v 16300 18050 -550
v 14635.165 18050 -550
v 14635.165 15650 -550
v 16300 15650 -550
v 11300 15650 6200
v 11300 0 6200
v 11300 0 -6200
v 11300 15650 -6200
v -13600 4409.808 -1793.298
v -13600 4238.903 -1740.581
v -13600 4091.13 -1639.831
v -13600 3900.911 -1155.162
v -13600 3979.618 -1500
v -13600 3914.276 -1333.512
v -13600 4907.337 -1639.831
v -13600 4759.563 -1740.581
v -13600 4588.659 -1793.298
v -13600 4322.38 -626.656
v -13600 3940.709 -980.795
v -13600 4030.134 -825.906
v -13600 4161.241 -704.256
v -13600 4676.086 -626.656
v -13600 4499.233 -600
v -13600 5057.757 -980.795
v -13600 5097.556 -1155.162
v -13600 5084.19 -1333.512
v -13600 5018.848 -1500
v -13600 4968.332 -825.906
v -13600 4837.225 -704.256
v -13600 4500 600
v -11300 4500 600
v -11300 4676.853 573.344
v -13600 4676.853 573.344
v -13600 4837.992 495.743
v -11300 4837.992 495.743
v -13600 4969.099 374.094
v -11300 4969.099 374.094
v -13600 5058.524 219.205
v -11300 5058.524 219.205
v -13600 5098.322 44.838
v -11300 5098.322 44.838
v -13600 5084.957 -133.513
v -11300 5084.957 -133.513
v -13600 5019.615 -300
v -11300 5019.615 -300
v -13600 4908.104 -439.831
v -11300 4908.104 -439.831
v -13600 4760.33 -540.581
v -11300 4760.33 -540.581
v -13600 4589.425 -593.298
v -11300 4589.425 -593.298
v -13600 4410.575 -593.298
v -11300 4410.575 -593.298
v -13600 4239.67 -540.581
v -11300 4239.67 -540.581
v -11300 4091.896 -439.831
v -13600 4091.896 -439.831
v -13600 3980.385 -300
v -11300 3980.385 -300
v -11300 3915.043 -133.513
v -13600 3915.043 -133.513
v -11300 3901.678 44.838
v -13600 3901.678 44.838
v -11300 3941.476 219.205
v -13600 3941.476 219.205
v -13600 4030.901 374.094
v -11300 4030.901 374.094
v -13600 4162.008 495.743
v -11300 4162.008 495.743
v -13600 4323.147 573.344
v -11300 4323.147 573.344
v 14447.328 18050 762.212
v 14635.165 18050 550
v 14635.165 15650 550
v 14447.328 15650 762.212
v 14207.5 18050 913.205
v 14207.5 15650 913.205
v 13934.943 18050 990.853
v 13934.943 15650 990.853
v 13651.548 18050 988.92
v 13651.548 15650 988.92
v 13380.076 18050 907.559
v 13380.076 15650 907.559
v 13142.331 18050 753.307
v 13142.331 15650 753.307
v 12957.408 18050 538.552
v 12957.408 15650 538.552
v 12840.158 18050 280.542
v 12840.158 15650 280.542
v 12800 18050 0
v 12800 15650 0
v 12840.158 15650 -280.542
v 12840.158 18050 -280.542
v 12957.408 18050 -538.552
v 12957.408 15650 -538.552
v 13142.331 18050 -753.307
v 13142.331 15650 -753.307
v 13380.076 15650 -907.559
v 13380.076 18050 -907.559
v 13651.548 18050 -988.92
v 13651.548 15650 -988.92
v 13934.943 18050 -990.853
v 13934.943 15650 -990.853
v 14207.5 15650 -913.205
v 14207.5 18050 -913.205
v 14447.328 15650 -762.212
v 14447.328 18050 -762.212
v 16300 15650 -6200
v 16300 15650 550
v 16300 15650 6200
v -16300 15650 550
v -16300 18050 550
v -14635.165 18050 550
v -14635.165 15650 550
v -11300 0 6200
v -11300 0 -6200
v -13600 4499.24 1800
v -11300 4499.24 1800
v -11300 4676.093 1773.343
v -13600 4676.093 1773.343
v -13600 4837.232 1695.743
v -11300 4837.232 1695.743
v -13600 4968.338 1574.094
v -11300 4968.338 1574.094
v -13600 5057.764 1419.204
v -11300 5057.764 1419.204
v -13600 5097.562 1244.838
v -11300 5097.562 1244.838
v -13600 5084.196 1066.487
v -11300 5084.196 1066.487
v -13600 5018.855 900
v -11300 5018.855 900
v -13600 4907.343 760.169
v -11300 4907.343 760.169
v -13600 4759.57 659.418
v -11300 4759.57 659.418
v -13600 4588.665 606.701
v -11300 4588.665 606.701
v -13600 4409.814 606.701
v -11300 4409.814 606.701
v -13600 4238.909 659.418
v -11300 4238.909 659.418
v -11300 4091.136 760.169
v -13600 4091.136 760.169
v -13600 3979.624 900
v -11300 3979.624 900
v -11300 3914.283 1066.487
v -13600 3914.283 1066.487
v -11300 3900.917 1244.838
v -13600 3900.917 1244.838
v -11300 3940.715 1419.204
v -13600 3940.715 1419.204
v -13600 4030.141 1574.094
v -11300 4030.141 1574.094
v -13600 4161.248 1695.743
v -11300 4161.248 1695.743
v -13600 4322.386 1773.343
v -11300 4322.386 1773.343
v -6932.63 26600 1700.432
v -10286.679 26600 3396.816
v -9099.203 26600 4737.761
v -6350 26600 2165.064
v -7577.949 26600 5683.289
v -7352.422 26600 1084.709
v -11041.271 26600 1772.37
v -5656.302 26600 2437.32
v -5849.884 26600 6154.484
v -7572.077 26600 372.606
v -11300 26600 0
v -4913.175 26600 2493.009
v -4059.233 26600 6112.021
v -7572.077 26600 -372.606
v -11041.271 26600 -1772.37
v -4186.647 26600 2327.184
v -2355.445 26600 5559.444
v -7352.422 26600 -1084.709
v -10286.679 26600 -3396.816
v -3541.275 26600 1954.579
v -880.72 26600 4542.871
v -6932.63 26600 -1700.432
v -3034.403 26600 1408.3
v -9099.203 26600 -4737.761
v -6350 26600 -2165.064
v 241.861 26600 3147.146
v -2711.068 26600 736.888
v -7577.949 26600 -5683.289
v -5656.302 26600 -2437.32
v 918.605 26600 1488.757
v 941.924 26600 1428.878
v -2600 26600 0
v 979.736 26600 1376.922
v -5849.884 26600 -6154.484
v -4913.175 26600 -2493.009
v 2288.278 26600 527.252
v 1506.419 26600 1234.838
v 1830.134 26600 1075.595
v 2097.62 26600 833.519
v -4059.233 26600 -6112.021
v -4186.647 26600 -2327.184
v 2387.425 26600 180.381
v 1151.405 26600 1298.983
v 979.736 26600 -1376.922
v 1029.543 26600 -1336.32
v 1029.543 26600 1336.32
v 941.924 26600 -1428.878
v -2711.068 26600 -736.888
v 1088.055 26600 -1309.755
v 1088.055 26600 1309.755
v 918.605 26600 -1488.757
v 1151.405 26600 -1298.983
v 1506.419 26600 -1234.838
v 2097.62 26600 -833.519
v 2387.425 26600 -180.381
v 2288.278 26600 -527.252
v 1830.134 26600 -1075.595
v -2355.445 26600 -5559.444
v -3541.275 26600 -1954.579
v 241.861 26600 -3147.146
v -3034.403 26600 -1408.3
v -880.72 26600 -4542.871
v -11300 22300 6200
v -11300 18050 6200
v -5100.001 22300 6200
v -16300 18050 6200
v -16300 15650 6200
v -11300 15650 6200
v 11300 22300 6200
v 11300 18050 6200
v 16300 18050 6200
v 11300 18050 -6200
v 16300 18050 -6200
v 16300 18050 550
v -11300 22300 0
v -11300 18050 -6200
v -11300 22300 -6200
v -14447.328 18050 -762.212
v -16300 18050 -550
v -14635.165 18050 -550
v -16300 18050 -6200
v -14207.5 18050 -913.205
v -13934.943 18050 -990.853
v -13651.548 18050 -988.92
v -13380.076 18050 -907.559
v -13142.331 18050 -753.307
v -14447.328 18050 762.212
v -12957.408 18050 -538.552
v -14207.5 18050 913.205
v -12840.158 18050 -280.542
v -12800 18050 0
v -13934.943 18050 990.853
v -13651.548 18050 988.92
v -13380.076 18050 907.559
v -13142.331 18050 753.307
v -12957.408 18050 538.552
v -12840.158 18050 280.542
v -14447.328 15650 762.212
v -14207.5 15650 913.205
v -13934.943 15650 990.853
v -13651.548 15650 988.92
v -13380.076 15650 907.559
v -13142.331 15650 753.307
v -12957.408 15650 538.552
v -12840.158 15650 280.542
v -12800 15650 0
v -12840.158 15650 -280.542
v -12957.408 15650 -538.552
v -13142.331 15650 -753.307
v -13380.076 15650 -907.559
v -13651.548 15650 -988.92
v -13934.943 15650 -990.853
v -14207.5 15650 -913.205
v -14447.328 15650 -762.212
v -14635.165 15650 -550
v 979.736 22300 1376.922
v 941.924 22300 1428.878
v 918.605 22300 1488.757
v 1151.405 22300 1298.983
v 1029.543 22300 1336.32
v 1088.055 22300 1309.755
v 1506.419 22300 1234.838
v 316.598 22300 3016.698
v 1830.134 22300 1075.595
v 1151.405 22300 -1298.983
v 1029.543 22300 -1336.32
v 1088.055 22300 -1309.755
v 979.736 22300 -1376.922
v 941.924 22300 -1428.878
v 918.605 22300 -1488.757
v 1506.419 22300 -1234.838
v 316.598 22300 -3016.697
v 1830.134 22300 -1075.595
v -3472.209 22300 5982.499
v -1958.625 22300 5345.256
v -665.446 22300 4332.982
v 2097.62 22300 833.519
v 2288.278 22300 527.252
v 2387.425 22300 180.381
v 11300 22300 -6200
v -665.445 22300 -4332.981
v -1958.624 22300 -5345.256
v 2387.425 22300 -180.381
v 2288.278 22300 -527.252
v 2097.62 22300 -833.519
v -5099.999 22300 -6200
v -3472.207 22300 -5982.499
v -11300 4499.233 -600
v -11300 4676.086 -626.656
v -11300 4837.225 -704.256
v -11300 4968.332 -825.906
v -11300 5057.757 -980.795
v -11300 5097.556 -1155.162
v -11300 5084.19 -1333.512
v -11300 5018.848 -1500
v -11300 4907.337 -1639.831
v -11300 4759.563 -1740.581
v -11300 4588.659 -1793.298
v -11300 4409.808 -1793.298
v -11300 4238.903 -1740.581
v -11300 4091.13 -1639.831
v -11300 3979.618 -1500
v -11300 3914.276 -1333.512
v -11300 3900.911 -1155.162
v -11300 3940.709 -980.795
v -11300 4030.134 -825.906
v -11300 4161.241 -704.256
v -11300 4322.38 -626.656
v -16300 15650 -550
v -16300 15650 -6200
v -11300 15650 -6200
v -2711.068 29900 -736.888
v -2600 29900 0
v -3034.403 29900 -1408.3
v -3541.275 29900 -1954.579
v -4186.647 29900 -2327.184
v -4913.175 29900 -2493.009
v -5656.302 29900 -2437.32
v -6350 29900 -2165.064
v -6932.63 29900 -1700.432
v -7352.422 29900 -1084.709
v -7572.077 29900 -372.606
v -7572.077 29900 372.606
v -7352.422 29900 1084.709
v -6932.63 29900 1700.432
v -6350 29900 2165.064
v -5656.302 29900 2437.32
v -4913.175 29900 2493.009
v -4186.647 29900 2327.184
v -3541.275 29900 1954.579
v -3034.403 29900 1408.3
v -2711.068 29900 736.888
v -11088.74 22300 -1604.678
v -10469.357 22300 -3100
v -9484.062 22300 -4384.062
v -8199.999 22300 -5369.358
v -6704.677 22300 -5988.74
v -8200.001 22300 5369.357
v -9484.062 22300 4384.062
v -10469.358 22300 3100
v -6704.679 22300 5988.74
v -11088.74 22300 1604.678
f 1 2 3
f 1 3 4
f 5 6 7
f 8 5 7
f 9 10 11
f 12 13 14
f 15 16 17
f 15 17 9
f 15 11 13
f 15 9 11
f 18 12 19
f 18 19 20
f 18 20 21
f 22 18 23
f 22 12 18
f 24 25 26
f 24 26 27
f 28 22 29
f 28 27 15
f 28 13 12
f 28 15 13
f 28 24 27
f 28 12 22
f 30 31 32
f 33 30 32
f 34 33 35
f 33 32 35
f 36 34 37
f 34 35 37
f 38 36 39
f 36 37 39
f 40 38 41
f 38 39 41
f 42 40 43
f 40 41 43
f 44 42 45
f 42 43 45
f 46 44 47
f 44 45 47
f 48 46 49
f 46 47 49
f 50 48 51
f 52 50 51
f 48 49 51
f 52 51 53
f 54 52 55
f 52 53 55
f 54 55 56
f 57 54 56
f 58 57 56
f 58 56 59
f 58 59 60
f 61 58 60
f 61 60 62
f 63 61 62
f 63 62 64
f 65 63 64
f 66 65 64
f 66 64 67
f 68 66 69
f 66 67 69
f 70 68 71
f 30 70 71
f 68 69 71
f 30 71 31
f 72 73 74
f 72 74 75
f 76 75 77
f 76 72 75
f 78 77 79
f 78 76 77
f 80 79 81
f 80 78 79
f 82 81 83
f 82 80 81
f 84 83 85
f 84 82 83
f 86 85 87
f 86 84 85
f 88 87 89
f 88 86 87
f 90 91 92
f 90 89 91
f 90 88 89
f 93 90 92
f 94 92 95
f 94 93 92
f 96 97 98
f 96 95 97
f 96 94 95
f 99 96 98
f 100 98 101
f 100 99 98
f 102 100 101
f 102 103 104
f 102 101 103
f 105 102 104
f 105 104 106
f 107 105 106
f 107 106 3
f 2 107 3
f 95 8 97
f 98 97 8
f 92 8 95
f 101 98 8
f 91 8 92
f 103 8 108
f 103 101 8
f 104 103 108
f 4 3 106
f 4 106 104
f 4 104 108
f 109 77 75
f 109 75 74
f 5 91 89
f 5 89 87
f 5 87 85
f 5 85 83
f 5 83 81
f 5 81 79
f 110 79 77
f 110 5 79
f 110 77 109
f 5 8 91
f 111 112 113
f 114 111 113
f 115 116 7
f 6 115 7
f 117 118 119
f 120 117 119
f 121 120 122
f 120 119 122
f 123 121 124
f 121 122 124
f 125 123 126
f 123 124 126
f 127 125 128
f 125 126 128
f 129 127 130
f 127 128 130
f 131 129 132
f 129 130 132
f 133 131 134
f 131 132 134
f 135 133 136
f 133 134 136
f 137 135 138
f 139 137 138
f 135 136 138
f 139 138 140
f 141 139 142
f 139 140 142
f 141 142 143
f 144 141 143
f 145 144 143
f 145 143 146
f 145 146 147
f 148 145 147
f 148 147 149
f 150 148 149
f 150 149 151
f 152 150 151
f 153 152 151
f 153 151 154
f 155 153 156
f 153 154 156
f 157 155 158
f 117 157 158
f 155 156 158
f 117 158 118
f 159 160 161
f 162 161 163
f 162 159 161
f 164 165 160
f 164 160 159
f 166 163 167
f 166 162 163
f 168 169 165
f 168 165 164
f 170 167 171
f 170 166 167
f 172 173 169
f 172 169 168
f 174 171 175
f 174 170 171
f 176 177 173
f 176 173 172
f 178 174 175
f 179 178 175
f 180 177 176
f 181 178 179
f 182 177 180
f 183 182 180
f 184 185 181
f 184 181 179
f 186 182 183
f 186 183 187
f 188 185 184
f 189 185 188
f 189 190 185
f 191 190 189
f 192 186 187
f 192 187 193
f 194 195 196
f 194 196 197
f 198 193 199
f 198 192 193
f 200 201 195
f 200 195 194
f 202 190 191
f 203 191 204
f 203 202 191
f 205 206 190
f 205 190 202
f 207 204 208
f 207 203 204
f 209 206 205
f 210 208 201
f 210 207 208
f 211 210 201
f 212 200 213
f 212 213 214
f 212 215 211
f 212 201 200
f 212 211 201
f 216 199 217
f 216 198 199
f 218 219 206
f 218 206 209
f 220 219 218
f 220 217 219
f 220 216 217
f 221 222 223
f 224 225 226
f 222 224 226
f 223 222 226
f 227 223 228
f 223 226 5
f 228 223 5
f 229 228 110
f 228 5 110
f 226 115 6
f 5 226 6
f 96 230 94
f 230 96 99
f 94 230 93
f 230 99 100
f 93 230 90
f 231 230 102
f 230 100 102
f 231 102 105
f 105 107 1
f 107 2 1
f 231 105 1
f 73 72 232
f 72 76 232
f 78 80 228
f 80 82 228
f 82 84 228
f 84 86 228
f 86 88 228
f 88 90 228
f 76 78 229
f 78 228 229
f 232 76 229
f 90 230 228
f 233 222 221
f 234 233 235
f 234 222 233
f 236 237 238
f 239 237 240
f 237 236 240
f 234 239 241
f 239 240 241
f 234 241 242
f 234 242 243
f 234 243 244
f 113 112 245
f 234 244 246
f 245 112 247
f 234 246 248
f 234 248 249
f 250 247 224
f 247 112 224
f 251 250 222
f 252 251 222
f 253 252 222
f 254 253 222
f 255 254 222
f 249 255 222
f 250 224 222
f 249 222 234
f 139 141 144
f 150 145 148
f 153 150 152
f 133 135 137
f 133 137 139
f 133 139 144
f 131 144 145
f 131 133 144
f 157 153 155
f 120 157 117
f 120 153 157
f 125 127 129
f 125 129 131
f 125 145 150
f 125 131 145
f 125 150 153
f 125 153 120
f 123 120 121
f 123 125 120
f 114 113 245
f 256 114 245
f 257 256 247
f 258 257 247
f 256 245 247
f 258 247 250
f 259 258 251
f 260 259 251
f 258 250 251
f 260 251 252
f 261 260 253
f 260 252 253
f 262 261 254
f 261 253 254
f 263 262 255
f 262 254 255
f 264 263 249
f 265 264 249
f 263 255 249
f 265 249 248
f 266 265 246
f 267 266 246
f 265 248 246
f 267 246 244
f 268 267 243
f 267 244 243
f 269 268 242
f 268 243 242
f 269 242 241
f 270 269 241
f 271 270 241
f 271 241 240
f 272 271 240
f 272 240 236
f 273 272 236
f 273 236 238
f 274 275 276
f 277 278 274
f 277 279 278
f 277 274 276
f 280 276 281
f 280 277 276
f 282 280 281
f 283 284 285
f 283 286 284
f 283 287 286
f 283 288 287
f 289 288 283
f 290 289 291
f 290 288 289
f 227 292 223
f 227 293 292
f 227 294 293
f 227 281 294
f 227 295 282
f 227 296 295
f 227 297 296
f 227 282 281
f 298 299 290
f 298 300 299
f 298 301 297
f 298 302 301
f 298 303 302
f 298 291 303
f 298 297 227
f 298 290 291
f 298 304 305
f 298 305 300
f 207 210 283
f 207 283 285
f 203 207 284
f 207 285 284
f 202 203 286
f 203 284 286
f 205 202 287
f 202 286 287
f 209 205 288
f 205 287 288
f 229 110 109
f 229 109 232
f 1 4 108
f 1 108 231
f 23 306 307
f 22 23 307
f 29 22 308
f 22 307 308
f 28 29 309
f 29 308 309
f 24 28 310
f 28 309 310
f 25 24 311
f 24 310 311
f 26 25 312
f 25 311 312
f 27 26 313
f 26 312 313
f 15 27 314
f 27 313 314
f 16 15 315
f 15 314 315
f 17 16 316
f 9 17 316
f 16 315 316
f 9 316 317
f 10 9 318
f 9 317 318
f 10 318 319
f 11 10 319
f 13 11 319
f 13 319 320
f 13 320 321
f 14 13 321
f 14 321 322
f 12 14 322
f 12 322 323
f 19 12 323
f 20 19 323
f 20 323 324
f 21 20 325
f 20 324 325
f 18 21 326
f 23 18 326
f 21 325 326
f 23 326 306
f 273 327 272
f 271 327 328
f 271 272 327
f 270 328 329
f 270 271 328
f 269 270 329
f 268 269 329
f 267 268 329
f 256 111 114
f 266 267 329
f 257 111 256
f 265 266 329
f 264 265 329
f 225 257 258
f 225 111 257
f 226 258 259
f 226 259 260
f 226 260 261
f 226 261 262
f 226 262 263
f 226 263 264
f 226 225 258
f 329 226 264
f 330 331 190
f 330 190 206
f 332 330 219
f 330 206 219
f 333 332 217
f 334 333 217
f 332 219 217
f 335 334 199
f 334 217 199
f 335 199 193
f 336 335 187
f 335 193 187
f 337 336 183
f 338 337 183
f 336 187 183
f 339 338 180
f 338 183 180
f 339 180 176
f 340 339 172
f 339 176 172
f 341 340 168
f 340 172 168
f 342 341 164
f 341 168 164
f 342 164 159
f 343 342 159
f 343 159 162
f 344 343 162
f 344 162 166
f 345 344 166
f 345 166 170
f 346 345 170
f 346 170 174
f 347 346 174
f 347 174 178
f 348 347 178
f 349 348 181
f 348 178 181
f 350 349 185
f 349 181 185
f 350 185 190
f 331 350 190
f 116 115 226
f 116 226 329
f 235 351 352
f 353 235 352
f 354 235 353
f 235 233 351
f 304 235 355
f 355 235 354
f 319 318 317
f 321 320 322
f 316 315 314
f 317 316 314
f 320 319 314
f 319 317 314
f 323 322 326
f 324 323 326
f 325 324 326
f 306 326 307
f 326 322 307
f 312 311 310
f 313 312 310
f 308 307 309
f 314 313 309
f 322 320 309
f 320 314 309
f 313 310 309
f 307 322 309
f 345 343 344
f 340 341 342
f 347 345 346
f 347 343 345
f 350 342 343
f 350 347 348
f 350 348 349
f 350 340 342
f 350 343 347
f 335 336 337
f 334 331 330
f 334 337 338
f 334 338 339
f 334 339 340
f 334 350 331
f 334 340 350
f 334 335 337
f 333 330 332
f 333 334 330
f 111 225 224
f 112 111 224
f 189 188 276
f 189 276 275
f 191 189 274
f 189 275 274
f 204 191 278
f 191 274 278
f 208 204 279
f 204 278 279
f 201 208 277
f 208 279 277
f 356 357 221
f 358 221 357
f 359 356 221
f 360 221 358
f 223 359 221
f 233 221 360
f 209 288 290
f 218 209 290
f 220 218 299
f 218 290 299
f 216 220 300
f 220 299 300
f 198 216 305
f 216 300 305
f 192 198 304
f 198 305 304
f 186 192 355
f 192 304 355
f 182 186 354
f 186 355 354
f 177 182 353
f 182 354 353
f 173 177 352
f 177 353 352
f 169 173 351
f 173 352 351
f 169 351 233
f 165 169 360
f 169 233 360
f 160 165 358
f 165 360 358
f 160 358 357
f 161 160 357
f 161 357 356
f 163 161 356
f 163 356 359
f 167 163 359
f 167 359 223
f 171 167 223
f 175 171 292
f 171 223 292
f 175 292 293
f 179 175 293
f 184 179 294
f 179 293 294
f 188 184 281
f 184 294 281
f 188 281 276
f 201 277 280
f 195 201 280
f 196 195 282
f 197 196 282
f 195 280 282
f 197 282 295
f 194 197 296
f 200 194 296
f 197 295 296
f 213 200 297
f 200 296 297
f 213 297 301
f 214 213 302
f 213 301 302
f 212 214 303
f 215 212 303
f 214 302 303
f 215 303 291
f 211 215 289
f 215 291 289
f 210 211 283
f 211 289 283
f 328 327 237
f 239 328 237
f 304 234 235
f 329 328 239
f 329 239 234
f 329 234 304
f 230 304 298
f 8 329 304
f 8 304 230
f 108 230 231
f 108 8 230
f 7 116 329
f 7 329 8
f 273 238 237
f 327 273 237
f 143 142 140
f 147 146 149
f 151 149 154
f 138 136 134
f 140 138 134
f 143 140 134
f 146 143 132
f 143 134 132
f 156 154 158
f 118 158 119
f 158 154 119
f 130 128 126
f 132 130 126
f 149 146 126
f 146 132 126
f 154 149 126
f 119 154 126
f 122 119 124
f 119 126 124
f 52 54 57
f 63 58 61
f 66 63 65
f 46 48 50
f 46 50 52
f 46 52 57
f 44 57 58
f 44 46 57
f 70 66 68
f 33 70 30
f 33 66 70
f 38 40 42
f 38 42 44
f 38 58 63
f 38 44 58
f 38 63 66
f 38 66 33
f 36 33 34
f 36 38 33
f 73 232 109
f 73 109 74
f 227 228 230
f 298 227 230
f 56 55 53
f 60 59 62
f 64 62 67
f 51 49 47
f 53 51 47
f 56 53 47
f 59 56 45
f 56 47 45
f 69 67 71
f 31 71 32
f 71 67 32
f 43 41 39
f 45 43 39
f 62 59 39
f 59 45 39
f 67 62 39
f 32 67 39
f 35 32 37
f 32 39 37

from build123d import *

# Parameters (mm, degrees)
SKETCH1_W             = 22600
SKETCH1_H             = 12400
BOSS_EXTRUDE1_DEPTH   = 22300
SKETCH2_W             = 5000
SKETCH2_H             = 2400
BOSS_EXTRUDE2_DEPTH   = 12400
CUT_EXTRUDE1_DEPTH    = 22300
BOSS_EXTRUDE3_DEPTH   = 4300
SKETCH5_R             = 2500
BOSS_EXTRUDE4_DEPTH   = 3300
SKETCH6_R             = 600
BOSS_EXTRUDE5_DEPTH   = 2300
BOSS_EXTRUDE5_2_DEPTH = 2300
BOSS_EXTRUDE5_3_DEPTH = 2300


with BuildPart() as part:
    # Sketch1 → Boss-Extrude1 (new body)
    with BuildSketch(Plane(origin=(0, 0, 0), x_dir=(1, 0, 0), z_dir=(0, 1, 0))):
        Rectangle(SKETCH1_W, SKETCH1_H)
    extrude(amount=BOSS_EXTRUDE1_DEPTH)

    # Sketch2 → Boss-Extrude2 (add)
    with BuildSketch(Plane.XY.offset(6200)):
        with Locations((13800, 16850)):
            Rectangle(SKETCH2_W, SKETCH2_H)
        with Locations((-13800, 16850)):
            Rectangle(SKETCH2_W, SKETCH2_H)
    extrude(amount=-BOSS_EXTRUDE2_DEPTH)

    # Sketch3 → Cut-Extrude1 (cut)
    with BuildSketch(Plane(origin=(0, 18050, 0), x_dir=(1, 0, 0), z_dir=(0, 1, 0))):
        with BuildLine():
            Line((14635.164654425, 550), (16300, 550))
            Line((16300, 550), (16300, -550))
            Line((16300, -550), (14635.164654425, -550))
            ThreePointArc((14635.164654425, -550), (12800, 0), (14635.164654425, 550))
        make_face()
        with BuildLine():
            Line((-16300, 550), (-16300, -550))
            Line((-16300, -550), (-14635.164654425, -550))
            ThreePointArc((-14635.164654425, -550), (-12800, 0), (-14635.164654425, 550))
            Line((-14635.164654425, 550), (-16300, 550))
        make_face()
    extrude(amount=-CUT_EXTRUDE1_DEPTH, mode=Mode.SUBTRACT)

    # Sketch4 → Boss-Extrude3 (add)
    with BuildSketch(Plane(origin=(0, 22300, 0), x_dir=(1, 0, 0), z_dir=(0, 1, 0))):
        with BuildLine():
            ThreePointArc((918.604651163, 1488.757217615), (-11300, 0), (918.604651163, -1488.757217615))
            ThreePointArc((918.604651163, -1488.757217615), (1003.329596305, -1355.013632202), (1151.404786681, -1298.983274683))
            ThreePointArc((1151.404786681, -1298.983274683), (2400, 0), (1151.404786681, 1298.983274683))
            ThreePointArc((1151.404786681, 1298.983274683), (1003.329596305, 1355.013632202), (918.604651163, 1488.757217615))
        make_face()
    extrude(amount=BOSS_EXTRUDE3_DEPTH)

    # Sketch5 → Boss-Extrude4 (add)
    with BuildSketch(Plane(origin=(0, 26600, 0), x_dir=(1, 0, 0), z_dir=(0, 1, 0))):
        with Locations((-5100, 0)):
            Circle(SKETCH5_R)
    extrude(amount=BOSS_EXTRUDE4_DEPTH)


with BuildPart() as body_2:
    # Sketch6 → Boss-Extrude5 (new body)
    with BuildSketch(Plane.ZY.offset(11300)):
        with Locations((0, 4500)):
            Circle(SKETCH6_R)
    extrude(amount=BOSS_EXTRUDE5_DEPTH)


with BuildPart() as body_3:
    # Sketch6 → Boss-Extrude5 2 (new body)
    with BuildSketch(Plane.ZY.offset(11300)):
        with Locations((1199.999759082, 4499.239603738)):
            Circle(SKETCH6_R)
    extrude(amount=BOSS_EXTRUDE5_2_DEPTH)


with BuildPart() as body_4:
    # Sketch6 → Boss-Extrude5 3 (new body)
    with BuildSketch(Plane.ZY.offset(11300)):
        with Locations((-1199.999755032, 4499.233238809)):
            Circle(SKETCH6_R)
    extrude(amount=BOSS_EXTRUDE5_3_DEPTH)


solid = Compound([part.part, body_2.part, body_3.part, body_4.part])
